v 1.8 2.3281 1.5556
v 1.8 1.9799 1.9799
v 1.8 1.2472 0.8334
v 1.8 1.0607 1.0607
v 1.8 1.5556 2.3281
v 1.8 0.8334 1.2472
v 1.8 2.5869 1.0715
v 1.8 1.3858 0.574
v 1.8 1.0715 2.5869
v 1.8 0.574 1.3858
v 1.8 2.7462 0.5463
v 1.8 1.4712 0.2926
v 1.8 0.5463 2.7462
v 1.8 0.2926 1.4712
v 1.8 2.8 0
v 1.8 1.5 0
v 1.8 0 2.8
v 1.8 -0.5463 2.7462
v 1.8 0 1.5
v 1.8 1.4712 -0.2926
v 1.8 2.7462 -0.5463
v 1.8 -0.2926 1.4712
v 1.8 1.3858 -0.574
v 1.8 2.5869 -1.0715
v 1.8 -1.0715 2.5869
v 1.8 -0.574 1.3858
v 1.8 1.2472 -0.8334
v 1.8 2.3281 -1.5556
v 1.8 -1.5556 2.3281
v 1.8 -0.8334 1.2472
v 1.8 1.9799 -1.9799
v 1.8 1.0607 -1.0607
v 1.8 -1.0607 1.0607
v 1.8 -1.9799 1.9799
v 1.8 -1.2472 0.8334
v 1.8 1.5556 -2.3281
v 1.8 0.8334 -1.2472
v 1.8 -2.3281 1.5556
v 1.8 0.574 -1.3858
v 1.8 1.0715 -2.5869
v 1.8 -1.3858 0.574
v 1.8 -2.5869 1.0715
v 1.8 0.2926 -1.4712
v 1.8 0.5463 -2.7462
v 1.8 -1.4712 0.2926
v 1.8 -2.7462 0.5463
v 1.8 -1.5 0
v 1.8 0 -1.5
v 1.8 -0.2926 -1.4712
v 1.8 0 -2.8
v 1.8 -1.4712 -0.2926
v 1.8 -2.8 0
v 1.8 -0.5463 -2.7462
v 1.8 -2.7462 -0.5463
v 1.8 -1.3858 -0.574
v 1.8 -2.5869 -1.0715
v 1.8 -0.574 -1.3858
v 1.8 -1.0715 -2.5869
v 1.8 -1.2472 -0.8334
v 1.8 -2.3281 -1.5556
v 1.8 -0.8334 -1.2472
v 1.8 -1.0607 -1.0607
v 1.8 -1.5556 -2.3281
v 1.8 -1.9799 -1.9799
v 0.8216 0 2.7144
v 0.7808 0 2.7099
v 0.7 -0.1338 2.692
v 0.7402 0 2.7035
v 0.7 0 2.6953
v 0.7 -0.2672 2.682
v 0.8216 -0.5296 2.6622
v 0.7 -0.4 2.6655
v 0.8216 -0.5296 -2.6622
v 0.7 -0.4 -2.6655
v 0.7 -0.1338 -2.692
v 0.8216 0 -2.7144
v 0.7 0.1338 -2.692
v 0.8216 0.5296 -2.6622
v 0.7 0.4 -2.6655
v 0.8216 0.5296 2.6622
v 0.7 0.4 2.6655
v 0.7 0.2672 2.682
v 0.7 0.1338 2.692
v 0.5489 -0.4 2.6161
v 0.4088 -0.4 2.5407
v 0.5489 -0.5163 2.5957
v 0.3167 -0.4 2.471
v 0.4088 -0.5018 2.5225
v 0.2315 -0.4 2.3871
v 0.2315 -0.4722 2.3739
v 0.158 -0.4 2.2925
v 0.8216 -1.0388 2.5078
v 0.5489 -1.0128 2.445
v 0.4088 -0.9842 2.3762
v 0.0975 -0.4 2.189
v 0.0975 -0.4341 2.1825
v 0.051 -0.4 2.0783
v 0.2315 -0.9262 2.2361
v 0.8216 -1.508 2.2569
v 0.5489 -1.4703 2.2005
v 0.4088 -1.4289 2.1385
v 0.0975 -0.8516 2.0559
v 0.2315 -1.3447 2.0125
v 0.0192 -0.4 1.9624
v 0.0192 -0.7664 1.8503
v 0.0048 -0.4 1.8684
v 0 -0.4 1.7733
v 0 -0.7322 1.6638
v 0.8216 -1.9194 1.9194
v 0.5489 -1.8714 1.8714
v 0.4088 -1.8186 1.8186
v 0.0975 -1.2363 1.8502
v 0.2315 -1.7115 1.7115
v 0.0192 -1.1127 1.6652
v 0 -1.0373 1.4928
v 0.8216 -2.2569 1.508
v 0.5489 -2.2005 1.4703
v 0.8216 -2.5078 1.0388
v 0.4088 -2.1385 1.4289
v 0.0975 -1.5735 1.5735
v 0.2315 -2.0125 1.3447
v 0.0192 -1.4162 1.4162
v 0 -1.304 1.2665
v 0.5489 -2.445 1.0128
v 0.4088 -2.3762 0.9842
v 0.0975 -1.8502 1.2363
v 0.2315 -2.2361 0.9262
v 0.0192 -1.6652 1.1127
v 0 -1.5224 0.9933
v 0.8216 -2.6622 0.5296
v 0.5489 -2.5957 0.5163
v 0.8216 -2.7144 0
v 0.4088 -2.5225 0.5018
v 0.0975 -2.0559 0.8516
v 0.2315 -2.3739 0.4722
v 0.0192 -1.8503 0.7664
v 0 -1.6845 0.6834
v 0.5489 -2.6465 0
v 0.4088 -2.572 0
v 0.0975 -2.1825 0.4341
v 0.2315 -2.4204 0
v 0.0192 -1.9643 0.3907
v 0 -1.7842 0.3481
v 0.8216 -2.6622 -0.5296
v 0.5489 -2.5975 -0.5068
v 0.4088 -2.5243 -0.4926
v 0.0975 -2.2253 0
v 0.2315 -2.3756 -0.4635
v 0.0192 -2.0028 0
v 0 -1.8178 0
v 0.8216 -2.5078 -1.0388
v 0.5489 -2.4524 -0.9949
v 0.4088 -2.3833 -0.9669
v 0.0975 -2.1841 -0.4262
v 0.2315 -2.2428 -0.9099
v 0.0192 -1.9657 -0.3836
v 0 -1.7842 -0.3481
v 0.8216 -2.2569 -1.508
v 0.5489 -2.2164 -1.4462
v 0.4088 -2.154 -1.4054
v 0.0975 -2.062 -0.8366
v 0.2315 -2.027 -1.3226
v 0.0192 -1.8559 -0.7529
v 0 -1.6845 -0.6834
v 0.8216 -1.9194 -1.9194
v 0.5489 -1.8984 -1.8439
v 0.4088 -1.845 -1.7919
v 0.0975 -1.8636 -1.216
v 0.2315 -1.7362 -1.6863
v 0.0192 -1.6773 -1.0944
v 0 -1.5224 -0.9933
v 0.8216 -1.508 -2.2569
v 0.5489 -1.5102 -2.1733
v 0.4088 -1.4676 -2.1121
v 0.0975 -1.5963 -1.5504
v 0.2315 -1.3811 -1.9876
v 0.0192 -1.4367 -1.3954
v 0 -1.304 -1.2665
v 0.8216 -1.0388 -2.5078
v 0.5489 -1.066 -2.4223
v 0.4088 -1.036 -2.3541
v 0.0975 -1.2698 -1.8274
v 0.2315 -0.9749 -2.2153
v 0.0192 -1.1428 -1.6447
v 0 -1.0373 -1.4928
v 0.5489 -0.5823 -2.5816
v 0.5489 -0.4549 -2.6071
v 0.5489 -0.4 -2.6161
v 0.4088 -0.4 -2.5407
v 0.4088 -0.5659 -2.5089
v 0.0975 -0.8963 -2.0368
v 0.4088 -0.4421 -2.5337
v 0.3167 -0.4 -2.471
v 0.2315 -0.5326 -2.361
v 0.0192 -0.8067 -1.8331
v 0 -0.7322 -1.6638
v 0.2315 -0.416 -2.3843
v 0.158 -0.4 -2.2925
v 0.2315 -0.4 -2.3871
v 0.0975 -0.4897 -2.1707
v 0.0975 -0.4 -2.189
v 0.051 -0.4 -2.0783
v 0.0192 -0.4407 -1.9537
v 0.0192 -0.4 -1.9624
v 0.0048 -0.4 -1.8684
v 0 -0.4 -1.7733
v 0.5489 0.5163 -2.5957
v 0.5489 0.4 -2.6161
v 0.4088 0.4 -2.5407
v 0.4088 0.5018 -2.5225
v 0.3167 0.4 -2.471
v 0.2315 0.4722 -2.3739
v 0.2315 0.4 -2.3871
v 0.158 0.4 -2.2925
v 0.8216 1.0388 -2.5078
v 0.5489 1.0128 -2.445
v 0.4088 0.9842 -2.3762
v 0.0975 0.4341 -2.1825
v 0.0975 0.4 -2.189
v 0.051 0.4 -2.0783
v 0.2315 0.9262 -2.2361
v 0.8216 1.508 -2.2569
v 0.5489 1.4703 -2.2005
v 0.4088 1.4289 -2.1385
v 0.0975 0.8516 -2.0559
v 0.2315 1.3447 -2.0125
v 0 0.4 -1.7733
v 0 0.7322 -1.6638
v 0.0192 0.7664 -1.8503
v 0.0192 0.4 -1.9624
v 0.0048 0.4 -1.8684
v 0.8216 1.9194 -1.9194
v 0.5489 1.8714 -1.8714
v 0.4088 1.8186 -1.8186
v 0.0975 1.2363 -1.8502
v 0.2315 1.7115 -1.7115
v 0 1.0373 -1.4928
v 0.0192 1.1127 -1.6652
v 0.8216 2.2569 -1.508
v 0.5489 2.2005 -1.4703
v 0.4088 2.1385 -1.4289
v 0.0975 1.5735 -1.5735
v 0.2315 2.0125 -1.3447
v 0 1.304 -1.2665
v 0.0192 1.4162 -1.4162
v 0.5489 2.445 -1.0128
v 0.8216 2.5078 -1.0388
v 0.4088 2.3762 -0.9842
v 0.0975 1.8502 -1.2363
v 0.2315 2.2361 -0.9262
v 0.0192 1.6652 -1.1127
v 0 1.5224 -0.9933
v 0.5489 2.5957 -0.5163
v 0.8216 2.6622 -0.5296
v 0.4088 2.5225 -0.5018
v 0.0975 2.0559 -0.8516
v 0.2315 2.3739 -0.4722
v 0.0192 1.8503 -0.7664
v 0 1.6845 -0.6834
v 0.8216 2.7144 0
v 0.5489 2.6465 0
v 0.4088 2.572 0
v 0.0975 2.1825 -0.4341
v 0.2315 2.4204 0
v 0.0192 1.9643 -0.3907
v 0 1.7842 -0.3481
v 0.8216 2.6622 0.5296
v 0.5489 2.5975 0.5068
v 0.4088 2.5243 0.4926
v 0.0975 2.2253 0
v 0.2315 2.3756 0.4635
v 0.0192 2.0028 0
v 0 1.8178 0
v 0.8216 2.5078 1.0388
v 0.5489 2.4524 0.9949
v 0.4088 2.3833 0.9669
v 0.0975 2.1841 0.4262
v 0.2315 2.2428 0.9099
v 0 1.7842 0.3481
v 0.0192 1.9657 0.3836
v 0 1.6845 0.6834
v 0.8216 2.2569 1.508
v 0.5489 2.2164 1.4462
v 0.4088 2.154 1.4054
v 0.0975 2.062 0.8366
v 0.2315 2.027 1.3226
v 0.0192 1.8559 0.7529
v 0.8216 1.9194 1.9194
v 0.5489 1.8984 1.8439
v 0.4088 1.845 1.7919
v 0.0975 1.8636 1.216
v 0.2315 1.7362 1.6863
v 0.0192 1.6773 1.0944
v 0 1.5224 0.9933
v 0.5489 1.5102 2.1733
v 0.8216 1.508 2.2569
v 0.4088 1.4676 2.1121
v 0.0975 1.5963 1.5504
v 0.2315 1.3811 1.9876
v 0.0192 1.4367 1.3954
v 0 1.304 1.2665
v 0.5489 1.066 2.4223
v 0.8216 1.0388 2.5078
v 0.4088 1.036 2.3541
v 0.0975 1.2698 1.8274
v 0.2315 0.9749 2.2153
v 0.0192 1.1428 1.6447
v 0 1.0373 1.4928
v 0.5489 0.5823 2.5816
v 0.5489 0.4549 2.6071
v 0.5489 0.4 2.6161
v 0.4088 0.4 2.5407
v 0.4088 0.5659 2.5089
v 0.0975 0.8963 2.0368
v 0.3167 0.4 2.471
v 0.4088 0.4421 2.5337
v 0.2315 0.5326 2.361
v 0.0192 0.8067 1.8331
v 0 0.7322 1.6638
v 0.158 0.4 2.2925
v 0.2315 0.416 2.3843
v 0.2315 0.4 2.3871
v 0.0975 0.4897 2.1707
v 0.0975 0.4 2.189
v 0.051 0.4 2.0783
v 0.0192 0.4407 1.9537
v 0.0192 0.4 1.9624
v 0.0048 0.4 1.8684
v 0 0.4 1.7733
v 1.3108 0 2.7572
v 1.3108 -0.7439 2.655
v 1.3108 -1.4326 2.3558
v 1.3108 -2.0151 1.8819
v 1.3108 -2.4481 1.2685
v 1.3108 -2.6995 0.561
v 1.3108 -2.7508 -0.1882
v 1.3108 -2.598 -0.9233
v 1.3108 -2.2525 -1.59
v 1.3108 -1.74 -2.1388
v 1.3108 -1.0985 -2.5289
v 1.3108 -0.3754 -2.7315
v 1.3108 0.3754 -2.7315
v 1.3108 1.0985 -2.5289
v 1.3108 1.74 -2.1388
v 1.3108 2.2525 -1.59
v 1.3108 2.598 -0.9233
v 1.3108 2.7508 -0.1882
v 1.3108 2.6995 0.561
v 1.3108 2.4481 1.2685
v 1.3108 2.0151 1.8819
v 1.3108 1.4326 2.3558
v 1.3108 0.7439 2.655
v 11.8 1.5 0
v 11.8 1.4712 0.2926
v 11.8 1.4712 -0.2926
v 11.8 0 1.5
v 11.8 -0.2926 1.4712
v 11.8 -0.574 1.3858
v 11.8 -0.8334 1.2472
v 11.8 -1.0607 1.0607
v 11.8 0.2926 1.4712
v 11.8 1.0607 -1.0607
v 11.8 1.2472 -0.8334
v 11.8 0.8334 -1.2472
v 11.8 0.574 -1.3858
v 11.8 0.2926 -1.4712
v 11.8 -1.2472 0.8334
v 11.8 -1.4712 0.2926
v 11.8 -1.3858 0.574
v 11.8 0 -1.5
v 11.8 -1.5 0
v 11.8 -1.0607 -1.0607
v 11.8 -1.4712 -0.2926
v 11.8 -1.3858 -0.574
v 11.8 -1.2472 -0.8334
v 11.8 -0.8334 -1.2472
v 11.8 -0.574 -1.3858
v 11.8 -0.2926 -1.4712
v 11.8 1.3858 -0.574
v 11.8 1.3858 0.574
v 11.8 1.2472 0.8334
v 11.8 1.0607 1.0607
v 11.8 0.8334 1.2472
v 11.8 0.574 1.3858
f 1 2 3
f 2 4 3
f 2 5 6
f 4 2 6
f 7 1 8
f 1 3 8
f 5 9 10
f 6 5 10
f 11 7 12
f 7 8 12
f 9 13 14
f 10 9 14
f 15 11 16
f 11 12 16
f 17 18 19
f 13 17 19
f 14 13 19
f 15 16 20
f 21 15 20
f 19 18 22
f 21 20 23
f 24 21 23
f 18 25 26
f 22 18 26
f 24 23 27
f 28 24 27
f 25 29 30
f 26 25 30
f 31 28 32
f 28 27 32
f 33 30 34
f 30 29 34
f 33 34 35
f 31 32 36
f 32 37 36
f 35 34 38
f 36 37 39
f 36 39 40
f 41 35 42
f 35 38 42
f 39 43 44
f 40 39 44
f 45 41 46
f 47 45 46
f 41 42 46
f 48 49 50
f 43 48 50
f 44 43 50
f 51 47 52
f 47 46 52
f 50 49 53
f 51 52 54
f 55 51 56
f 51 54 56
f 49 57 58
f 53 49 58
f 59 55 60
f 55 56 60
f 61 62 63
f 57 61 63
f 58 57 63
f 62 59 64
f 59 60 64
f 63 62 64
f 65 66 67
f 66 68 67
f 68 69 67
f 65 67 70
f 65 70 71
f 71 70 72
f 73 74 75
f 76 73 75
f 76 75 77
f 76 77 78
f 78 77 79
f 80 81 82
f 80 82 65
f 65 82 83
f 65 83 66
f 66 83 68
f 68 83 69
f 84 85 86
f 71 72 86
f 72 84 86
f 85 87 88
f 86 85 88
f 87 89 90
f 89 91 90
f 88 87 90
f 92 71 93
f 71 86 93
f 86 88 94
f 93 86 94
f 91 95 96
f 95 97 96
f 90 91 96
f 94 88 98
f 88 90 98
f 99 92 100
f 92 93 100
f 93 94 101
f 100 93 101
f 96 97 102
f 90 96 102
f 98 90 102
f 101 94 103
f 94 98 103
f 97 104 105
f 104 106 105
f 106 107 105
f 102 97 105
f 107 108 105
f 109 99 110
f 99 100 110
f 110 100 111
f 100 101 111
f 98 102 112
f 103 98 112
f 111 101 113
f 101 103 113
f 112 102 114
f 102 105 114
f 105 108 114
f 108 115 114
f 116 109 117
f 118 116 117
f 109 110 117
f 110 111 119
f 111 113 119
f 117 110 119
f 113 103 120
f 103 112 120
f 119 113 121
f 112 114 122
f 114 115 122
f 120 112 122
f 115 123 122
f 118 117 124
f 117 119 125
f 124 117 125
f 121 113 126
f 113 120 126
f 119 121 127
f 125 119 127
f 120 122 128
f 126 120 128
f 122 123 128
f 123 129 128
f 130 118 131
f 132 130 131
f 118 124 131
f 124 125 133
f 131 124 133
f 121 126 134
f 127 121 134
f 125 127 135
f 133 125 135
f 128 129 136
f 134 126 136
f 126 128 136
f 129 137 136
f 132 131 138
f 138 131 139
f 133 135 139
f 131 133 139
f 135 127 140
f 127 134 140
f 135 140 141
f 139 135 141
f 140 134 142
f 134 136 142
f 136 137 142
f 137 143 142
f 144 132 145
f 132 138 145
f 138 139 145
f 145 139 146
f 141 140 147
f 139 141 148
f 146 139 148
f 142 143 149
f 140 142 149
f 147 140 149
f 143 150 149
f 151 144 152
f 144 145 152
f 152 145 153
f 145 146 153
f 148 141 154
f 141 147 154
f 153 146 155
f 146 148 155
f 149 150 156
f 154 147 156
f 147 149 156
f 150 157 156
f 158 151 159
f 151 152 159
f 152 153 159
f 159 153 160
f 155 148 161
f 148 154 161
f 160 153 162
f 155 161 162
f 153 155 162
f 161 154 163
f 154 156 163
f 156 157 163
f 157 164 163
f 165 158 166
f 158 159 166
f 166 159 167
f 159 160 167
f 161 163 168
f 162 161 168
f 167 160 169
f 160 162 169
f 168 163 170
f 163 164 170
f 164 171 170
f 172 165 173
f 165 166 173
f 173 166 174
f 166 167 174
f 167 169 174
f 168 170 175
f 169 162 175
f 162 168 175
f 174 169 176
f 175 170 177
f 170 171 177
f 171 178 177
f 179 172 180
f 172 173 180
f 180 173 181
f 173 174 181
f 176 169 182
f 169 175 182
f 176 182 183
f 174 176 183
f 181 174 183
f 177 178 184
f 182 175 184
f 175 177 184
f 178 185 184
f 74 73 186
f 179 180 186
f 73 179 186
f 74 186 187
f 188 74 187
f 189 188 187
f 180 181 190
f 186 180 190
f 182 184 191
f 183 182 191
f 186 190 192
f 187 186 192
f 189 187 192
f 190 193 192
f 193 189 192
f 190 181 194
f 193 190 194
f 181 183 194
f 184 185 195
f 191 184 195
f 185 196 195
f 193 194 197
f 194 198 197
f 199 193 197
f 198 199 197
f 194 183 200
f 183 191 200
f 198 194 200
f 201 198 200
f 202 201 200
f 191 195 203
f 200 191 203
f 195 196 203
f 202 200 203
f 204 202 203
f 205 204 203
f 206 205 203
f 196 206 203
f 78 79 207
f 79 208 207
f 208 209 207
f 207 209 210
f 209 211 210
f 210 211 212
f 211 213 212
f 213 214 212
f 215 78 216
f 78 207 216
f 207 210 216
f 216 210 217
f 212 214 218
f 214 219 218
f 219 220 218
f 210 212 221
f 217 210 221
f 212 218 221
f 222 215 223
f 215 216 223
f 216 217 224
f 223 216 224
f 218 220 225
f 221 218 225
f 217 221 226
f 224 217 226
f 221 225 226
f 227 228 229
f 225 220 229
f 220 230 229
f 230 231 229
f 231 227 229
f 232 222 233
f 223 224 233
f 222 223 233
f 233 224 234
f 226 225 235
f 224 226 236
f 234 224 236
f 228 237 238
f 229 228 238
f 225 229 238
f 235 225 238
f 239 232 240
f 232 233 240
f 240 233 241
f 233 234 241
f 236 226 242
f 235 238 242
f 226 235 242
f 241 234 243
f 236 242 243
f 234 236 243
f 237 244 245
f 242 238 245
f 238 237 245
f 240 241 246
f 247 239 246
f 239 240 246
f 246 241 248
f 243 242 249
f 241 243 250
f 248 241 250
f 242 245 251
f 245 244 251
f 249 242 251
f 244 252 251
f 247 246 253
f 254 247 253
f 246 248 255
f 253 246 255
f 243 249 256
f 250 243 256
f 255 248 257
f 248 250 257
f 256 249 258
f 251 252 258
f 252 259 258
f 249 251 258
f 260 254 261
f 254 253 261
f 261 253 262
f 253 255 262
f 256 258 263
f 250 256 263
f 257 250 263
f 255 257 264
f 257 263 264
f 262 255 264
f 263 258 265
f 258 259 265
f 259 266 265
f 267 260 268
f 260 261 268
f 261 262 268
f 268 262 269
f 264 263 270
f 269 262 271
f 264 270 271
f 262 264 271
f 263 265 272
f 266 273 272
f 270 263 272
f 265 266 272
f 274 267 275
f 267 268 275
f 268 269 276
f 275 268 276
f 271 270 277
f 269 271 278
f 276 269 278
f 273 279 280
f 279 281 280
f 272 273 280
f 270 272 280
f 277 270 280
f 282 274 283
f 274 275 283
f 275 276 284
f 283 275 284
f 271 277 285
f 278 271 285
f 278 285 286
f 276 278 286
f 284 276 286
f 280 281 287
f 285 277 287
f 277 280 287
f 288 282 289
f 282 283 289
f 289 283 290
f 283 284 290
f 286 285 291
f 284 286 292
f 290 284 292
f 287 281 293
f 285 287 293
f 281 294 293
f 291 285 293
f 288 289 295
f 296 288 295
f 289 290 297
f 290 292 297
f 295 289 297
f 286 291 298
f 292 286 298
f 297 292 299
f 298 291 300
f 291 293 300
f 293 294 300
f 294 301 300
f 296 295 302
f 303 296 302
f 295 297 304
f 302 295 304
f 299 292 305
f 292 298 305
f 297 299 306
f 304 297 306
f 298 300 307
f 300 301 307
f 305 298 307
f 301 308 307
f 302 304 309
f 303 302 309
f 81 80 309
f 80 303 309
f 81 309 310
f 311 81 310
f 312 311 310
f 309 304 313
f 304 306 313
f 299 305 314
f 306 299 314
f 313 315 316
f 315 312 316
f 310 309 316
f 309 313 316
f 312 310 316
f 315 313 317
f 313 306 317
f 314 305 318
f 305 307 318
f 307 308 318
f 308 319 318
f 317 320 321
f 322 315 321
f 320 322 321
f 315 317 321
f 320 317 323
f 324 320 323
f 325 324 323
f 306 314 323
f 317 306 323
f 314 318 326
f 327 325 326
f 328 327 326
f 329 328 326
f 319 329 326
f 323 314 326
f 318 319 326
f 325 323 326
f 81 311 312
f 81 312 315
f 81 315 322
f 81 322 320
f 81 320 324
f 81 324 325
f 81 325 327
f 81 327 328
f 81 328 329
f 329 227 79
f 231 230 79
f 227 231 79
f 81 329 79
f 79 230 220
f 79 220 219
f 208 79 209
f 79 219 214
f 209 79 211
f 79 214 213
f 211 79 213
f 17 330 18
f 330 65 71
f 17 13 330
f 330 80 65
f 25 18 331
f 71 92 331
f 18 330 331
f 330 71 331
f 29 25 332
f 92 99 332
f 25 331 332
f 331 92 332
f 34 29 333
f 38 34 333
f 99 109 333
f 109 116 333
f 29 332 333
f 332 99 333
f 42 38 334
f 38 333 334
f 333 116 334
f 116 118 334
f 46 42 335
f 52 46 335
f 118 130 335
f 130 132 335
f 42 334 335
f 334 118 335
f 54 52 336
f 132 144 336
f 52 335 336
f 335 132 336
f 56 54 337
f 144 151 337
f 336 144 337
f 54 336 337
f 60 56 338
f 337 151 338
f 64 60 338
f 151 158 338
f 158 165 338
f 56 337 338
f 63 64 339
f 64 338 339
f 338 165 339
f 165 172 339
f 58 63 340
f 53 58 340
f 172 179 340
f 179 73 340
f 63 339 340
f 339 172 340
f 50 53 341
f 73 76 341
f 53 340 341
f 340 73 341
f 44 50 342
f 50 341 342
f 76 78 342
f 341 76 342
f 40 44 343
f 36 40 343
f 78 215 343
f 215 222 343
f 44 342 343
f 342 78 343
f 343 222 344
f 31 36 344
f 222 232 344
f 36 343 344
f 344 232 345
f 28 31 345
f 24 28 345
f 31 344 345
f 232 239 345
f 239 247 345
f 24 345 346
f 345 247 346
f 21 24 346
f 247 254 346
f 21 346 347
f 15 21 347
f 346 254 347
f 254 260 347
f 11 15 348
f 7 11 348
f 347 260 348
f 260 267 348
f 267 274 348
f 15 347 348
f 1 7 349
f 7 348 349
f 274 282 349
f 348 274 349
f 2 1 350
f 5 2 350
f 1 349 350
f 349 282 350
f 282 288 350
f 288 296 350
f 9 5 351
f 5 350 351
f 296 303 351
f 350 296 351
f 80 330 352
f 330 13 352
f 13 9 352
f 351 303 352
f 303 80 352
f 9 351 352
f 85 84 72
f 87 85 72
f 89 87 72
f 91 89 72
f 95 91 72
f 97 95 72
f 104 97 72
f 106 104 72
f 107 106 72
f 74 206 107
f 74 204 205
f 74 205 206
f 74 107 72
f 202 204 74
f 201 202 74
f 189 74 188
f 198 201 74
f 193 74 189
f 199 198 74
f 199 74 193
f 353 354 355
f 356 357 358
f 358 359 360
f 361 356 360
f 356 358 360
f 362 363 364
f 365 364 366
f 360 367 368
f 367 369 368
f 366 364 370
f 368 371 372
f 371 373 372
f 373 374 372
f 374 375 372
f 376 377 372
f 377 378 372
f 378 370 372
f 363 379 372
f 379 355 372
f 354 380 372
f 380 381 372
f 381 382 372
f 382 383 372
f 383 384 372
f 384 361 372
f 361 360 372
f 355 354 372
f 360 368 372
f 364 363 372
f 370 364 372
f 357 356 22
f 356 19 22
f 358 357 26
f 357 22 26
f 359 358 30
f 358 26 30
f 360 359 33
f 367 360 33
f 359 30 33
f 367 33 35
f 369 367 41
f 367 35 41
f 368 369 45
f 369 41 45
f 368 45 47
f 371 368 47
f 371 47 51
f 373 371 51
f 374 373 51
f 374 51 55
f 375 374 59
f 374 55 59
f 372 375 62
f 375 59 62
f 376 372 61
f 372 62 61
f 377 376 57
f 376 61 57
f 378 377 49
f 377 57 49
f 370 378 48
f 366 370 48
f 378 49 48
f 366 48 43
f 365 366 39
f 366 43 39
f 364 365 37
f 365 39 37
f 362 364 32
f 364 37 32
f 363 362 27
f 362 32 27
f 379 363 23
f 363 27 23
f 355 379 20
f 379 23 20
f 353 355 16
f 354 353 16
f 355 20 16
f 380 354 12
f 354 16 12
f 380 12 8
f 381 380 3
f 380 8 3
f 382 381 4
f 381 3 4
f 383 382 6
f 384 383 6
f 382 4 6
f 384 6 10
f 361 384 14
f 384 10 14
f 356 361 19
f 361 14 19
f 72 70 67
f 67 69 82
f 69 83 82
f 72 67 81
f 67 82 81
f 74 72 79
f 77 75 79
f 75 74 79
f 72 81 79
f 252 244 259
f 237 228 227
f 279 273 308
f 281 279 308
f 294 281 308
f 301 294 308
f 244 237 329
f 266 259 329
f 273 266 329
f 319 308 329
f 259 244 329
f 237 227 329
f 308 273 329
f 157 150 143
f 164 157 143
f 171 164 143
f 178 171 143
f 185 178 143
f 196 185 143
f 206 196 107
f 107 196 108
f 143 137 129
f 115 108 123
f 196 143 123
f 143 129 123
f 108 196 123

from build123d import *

# Parameters (mm, degrees)
FILLET2_R  = 0.9
SKETCH2_W  = 5.6
SKETCH2_H  = 0.8
SLOT_DEPTH = 0.7


with BuildPart() as part:
    # BodySke → Base-Revolve (revolve)
    with BuildSketch(Plane.XY, mode=Mode.PRIVATE) as base_revolve_sk:
        Polygon((1.8, 1.5), (1.8, 2.8), (0, 2.642520406), (0, 0), (11.8, 0), (11.8, 1.5), align=None)
    revolve(base_revolve_sk.sketch.rotate(Axis((-25.4, 0, 0), (1, 0, 0)), 90), axis=Axis((-25.4, 0, 0), (1, 0, 0)))  # turned: the seam where the file's is

    # Fillet2
    fillet2_edges = [part.edges().sort_by_distance(p)[0] for p in [
        (0, 0, -2.642520406),
    ]]
    fillet(fillet2_edges, radius=FILLET2_R)

    # Sketch2 → Slot (cut)
    with BuildSketch(Plane(origin=(0, 0, 0), x_dir=(0, 0, -1), z_dir=(1, 0, 0))):
        Rectangle(SKETCH2_W, SKETCH2_H)
    extrude(amount=SLOT_DEPTH, mode=Mode.SUBTRACT)


solid = part.part
